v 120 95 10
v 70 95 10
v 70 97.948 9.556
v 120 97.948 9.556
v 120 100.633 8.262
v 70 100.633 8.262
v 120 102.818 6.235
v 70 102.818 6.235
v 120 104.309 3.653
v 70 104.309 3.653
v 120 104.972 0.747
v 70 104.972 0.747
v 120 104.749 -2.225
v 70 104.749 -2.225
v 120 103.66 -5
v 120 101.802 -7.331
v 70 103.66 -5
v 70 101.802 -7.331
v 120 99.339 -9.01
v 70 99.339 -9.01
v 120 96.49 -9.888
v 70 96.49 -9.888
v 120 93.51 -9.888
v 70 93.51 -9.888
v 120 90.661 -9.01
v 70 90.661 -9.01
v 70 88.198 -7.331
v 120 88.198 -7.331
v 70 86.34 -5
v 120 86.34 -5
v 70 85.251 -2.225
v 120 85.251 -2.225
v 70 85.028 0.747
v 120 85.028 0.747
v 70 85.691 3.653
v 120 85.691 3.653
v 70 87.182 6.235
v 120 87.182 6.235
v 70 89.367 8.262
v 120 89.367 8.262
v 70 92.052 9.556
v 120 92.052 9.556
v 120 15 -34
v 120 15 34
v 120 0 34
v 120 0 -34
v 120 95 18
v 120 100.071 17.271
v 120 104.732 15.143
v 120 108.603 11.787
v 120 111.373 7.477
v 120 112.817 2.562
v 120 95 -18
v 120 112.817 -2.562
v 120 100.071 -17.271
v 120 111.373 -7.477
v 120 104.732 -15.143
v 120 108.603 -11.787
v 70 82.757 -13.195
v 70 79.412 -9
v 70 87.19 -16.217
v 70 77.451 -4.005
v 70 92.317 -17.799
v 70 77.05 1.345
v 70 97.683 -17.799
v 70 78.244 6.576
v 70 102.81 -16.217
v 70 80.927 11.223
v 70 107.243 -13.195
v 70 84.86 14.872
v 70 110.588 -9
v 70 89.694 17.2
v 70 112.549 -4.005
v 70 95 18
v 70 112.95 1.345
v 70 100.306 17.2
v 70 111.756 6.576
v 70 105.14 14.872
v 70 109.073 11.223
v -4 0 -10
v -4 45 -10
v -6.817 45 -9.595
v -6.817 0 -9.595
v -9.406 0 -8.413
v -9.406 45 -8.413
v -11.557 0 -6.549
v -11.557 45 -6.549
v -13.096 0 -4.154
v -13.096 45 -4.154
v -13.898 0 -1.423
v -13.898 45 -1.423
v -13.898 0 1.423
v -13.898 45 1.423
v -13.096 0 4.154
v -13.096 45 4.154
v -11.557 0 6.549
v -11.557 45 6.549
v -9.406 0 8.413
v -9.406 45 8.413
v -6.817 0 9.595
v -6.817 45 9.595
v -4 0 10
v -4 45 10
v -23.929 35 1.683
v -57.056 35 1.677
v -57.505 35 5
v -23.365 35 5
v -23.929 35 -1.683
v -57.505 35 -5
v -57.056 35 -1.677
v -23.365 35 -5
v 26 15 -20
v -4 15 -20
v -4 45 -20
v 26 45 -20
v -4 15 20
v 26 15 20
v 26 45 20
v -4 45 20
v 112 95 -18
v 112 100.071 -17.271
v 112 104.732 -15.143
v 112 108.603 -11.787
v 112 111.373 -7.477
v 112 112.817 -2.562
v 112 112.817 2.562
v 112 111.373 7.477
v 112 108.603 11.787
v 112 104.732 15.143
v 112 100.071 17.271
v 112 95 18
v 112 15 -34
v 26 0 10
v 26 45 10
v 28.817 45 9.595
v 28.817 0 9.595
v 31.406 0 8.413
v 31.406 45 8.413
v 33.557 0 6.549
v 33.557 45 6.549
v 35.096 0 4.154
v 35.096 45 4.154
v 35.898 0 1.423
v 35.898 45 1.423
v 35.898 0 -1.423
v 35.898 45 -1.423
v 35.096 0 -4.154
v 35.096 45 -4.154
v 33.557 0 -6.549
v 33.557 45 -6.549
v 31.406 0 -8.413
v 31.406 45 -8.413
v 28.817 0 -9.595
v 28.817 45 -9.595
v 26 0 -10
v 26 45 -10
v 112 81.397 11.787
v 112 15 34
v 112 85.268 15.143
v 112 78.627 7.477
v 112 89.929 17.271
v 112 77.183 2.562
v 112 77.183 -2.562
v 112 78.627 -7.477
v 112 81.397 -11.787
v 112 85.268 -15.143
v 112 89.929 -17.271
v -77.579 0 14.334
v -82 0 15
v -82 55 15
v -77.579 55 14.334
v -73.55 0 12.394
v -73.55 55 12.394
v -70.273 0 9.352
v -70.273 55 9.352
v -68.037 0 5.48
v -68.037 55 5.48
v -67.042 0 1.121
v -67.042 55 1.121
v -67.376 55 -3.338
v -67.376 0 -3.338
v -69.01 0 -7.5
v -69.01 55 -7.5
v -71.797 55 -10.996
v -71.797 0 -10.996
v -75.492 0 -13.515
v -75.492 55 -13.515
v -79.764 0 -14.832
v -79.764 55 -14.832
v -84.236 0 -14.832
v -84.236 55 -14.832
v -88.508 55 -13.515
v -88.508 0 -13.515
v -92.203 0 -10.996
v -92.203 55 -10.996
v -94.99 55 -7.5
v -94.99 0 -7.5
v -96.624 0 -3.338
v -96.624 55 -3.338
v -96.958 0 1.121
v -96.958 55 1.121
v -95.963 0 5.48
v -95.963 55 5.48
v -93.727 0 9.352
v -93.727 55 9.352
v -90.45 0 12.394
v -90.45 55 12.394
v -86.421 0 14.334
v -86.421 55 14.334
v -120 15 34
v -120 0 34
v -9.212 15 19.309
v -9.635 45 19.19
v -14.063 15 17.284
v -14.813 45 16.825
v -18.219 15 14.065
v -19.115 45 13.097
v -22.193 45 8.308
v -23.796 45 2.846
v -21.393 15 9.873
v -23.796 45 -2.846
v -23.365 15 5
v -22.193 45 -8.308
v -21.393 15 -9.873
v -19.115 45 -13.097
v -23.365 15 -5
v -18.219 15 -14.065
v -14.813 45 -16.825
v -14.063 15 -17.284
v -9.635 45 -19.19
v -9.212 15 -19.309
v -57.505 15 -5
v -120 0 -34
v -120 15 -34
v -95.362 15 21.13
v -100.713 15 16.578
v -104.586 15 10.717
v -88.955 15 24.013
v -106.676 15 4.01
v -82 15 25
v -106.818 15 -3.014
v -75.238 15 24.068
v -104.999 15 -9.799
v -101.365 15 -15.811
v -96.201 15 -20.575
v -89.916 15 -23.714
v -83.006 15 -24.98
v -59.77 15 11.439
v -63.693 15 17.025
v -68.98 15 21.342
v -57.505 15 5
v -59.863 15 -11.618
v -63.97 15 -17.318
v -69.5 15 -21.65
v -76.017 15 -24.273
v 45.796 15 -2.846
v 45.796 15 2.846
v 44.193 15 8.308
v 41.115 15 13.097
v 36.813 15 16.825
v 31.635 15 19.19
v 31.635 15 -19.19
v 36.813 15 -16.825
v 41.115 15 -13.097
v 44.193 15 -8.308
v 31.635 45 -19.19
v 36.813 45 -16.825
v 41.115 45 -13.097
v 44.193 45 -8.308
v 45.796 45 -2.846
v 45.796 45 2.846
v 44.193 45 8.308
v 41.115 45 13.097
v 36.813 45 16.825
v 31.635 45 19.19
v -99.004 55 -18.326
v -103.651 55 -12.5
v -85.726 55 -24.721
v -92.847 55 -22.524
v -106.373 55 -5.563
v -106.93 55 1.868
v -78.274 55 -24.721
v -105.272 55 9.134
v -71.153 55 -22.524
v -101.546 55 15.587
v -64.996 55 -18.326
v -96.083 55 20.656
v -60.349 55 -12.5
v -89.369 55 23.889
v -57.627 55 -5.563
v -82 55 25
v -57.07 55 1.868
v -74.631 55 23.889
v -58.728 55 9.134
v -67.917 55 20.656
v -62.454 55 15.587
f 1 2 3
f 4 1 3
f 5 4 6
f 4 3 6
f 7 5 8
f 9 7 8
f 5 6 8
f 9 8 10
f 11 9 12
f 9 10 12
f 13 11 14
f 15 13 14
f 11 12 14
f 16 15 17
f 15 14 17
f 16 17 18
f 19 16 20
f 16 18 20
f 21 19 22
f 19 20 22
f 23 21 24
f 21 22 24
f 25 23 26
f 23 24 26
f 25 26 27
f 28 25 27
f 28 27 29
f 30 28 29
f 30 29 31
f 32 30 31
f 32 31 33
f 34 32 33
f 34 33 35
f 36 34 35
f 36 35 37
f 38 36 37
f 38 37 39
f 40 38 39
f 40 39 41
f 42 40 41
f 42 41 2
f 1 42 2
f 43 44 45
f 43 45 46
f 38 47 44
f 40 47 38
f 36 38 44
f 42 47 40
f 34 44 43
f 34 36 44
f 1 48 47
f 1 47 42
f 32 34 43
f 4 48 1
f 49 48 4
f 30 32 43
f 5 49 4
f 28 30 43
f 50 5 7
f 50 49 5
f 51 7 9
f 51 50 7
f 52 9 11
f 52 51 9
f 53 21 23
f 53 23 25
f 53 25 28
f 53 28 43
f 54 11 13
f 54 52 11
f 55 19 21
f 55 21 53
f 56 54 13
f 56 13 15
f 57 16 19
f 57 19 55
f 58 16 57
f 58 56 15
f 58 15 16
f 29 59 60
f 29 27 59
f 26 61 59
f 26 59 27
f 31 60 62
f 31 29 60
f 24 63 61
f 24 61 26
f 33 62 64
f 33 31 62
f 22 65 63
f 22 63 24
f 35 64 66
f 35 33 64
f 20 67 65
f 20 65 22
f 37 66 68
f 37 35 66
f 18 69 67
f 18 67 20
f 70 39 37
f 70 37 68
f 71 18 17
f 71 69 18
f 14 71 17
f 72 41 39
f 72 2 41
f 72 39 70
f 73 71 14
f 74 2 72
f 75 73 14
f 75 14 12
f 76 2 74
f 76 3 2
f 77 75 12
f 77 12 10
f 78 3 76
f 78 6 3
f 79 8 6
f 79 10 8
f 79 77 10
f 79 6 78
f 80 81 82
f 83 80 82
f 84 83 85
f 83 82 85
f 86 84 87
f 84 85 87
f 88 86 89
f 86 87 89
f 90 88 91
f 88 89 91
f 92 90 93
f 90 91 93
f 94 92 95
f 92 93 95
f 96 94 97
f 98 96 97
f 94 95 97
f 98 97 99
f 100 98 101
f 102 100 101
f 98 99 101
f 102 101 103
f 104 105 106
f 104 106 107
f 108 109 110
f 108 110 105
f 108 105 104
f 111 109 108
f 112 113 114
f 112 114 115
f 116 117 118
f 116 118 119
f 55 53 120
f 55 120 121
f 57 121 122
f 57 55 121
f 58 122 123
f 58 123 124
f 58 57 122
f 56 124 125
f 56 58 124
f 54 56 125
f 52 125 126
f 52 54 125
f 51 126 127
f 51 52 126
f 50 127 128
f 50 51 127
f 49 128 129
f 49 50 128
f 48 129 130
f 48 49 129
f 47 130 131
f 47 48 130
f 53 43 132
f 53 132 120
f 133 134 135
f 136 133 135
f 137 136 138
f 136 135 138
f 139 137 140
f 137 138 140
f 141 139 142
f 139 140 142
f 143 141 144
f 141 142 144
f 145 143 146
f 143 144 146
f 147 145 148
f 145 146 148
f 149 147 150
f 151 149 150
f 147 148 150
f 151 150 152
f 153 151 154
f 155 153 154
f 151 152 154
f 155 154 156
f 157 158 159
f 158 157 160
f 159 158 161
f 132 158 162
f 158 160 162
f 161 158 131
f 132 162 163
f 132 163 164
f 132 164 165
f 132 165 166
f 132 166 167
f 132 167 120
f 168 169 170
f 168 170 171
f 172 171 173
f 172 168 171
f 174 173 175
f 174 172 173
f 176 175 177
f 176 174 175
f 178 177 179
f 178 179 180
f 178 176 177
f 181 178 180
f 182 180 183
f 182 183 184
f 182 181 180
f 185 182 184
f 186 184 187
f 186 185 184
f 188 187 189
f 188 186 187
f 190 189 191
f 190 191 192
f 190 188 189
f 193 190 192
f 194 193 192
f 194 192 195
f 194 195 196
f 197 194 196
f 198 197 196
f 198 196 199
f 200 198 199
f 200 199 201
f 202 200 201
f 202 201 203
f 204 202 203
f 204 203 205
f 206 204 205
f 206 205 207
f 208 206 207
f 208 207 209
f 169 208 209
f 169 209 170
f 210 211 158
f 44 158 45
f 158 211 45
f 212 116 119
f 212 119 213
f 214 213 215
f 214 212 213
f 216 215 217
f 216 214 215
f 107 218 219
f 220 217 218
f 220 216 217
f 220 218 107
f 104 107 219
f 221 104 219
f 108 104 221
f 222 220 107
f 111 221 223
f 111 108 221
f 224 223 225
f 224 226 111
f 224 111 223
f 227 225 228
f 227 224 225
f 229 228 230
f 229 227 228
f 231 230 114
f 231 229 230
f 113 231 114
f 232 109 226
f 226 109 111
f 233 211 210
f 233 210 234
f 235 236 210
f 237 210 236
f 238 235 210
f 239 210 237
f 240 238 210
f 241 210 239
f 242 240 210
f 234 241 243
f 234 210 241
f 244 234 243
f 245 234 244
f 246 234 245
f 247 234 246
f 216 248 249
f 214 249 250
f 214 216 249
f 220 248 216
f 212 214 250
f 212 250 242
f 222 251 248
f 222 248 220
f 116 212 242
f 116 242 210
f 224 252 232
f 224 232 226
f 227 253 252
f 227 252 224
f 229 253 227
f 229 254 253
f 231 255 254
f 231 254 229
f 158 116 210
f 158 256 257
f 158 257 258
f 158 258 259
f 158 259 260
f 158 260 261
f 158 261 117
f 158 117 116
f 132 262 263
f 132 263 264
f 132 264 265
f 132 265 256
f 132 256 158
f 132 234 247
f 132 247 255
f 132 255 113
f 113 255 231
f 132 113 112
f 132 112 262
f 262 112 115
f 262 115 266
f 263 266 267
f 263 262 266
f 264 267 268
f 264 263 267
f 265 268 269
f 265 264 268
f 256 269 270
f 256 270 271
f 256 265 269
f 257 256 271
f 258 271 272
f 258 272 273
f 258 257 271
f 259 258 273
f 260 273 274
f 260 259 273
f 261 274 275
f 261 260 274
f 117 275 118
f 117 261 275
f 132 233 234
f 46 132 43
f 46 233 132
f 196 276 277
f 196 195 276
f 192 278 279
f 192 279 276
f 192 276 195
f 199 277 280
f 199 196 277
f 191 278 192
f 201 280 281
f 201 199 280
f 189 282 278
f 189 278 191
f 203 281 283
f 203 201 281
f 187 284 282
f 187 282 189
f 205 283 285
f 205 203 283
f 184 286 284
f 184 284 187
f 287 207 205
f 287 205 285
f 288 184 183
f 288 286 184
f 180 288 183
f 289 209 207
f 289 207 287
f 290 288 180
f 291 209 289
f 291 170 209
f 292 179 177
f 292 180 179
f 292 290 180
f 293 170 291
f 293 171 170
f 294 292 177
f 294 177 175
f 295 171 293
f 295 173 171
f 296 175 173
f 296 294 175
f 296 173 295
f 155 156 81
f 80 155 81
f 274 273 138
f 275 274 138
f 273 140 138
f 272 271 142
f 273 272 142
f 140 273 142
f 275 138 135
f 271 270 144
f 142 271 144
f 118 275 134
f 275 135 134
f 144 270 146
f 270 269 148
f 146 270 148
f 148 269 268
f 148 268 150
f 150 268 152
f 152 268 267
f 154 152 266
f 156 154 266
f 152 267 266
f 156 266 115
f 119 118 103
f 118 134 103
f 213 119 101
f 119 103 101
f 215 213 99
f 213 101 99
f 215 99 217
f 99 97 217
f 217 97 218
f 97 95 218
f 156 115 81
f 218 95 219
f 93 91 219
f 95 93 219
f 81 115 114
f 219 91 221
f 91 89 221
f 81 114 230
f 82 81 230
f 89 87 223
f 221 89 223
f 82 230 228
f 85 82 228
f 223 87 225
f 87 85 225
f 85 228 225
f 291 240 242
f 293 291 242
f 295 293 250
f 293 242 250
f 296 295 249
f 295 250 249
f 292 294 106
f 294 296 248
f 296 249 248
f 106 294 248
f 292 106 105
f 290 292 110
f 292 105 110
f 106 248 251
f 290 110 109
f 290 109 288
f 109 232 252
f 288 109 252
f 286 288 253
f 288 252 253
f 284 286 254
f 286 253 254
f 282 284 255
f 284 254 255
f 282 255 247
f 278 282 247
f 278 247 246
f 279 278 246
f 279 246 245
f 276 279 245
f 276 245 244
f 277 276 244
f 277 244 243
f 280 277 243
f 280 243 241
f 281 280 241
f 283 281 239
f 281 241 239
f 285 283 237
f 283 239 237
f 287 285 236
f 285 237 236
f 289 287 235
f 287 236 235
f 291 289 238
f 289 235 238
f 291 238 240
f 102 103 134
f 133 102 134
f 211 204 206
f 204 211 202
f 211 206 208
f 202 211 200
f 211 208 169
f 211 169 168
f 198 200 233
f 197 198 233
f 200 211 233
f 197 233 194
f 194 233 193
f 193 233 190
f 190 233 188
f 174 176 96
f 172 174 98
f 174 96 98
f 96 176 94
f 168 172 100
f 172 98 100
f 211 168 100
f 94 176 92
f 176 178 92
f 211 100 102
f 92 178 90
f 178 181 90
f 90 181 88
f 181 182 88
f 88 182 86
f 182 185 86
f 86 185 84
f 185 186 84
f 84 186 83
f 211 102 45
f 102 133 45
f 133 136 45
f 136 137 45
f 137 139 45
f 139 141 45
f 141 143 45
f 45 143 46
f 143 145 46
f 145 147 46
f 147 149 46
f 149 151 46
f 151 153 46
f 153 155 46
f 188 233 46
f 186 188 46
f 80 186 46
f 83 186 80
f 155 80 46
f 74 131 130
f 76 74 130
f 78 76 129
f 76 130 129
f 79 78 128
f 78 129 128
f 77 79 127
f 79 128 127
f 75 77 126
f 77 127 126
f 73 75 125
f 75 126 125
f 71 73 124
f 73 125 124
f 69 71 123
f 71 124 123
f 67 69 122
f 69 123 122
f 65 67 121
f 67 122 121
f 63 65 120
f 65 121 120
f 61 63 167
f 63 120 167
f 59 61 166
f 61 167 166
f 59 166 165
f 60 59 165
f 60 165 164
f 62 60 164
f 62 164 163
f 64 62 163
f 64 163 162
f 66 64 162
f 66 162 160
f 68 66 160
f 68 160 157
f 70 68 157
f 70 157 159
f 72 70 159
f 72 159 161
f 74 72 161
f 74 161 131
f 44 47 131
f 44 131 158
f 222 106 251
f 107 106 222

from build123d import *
from build123d.topology import SkipClean

# Parameters (mm, degrees)
SKETCH2_W           = 240
SKETCH2_H           = 68
BOSS_EXTRUDE1_DEPTH = 15
SKETCH4_R           = 25
SKETCH4_R_2         = 15
BOSS_EXTRUDE4_DEPTH = 40
CUT_EXTRUDE2_START  = -40
SKETCH7_R           = 15
CUT_EXTRUDE2_DEPTH  = 40
BOSS_EXTRUDE5_DEPTH = 30
CUT_EXTRUDE3_DEPTH  = 77
RIB3_REACH          = 138.312
SKETCH11_WALL_W     = 307.624283584
SKETCH11_WALL_H     = 10
BOSS_EXTRUDE6_DEPTH = 8
SKETCH13_R          = 18
BOSS_EXTRUDE7_DEPTH = 42
SKETCH14_R          = 10
CUT_EXTRUDE4_DEPTH  = 67


with BuildPart() as part:
    # Sketch2 → Boss-Extrude1 (new body)
    with BuildSketch(Plane(origin=(0, 0, 0), x_dir=(1, 0, 0), z_dir=(0, 1, 0))):
        Rectangle(SKETCH2_W, SKETCH2_H)
    extrude(amount=BOSS_EXTRUDE1_DEPTH)

    # Sketch4 → Boss-Extrude4 (add)
    with BuildSketch(Plane(origin=(0, 15, 0), x_dir=(1, 0, 0), z_dir=(0, 1, 0))):
        with Locations((-82, 0)):
            Circle(SKETCH4_R)
        with Locations((-82, 0)):
            Circle(SKETCH4_R_2, mode=Mode.SUBTRACT)
    extrude(amount=BOSS_EXTRUDE4_DEPTH)

    # Sketch7 → Cut-Extrude2 (cut)
    with BuildSketch(Plane(origin=(0, 15, 0), x_dir=(1, 0, 0), z_dir=(0, 1, 0)).offset(CUT_EXTRUDE2_START)):
        with Locations((-82, 0)):
            Circle(SKETCH7_R)
    extrude(amount=CUT_EXTRUDE2_DEPTH, mode=Mode.SUBTRACT)

    # Sketch8 → Boss-Extrude5 (add)
    with BuildSketch(Plane(origin=(0, 15, 0), x_dir=(1, 0, 0), z_dir=(0, 1, 0))):
        with BuildLine():
            Line((-4, 20), (26, 20))
            ThreePointArc((26, 20), (46, 0), (26, -20))
            Line((26, -20), (-4, -20))
            ThreePointArc((-4, -20), (-24, 0), (-4, 20))
        make_face()
    extrude(amount=BOSS_EXTRUDE5_DEPTH)

    # Sketch9 → Cut-Extrude3 (cut)
    with BuildSketch(Plane(origin=(0, 45, 0), x_dir=(1, 0, 0), z_dir=(0, 1, 0))):
        with BuildLine():
            Line((-4, -10), (26, -10))
            ThreePointArc((26, -10), (36, 0), (26, 10))
            Line((26, 10), (-4, 10))
            ThreePointArc((-4, 10), (-14, 0), (-4, -10))
        make_face()
    extrude(amount=-CUT_EXTRUDE3_DEPTH, mode=Mode.SUBTRACT)

    # Sketch11 wall → Rib3 (add, up to next)
    with BuildSketch(Plane(origin=(-40.5, 35, 0), x_dir=(1, 0, 0), z_dir=(0, 1, 0)), mode=Mode.PRIVATE) as rib3_sk1:
        Rectangle(SKETCH11_WALL_W, SKETCH11_WALL_H)
    rib3_tool1 = extrude(rib3_sk1.sketch, amount=-RIB3_REACH, mode=Mode.PRIVATE) - part.part
    add(rib3_tool1.solids().sort_by_distance((-40.5, 35, 0))[0])

    # Sketch12 → Boss-Extrude6 (add)
    with BuildSketch(Plane(origin=(120, 0, 0), x_dir=(0, 0, -1), z_dir=(1, 0, 0))):
        with BuildLine():
            Line((-18, 95), (-34, 15))
            Line((-34, 15), (34, 15))
            Line((34, 15), (18, 95))
            ThreePointArc((18, 95), (0, 113), (-18, 95))
        make_face()
    extrude(amount=-BOSS_EXTRUDE6_DEPTH)

    # Sketch13 → Boss-Extrude7 (add)
    with SkipClean():  # the faces are left unmerged after this step: merging them gives an invalid solid
        with BuildSketch(Plane.ZY.offset(-112)):
            with Locations((0, 95)):
                Circle(SKETCH13_R)
        extrude(amount=BOSS_EXTRUDE7_DEPTH)
    add(part.part.scale(1), mode=Mode.REPLACE)  # the faces are merged on a copy

    # Sketch14 → Cut-Extrude4 (cut)
    with BuildSketch(Plane.ZY.offset(-70)):
        with Locations((0, 95)):
            Circle(SKETCH14_R)
    extrude(amount=-CUT_EXTRUDE4_DEPTH, mode=Mode.SUBTRACT)


solid = part.part
